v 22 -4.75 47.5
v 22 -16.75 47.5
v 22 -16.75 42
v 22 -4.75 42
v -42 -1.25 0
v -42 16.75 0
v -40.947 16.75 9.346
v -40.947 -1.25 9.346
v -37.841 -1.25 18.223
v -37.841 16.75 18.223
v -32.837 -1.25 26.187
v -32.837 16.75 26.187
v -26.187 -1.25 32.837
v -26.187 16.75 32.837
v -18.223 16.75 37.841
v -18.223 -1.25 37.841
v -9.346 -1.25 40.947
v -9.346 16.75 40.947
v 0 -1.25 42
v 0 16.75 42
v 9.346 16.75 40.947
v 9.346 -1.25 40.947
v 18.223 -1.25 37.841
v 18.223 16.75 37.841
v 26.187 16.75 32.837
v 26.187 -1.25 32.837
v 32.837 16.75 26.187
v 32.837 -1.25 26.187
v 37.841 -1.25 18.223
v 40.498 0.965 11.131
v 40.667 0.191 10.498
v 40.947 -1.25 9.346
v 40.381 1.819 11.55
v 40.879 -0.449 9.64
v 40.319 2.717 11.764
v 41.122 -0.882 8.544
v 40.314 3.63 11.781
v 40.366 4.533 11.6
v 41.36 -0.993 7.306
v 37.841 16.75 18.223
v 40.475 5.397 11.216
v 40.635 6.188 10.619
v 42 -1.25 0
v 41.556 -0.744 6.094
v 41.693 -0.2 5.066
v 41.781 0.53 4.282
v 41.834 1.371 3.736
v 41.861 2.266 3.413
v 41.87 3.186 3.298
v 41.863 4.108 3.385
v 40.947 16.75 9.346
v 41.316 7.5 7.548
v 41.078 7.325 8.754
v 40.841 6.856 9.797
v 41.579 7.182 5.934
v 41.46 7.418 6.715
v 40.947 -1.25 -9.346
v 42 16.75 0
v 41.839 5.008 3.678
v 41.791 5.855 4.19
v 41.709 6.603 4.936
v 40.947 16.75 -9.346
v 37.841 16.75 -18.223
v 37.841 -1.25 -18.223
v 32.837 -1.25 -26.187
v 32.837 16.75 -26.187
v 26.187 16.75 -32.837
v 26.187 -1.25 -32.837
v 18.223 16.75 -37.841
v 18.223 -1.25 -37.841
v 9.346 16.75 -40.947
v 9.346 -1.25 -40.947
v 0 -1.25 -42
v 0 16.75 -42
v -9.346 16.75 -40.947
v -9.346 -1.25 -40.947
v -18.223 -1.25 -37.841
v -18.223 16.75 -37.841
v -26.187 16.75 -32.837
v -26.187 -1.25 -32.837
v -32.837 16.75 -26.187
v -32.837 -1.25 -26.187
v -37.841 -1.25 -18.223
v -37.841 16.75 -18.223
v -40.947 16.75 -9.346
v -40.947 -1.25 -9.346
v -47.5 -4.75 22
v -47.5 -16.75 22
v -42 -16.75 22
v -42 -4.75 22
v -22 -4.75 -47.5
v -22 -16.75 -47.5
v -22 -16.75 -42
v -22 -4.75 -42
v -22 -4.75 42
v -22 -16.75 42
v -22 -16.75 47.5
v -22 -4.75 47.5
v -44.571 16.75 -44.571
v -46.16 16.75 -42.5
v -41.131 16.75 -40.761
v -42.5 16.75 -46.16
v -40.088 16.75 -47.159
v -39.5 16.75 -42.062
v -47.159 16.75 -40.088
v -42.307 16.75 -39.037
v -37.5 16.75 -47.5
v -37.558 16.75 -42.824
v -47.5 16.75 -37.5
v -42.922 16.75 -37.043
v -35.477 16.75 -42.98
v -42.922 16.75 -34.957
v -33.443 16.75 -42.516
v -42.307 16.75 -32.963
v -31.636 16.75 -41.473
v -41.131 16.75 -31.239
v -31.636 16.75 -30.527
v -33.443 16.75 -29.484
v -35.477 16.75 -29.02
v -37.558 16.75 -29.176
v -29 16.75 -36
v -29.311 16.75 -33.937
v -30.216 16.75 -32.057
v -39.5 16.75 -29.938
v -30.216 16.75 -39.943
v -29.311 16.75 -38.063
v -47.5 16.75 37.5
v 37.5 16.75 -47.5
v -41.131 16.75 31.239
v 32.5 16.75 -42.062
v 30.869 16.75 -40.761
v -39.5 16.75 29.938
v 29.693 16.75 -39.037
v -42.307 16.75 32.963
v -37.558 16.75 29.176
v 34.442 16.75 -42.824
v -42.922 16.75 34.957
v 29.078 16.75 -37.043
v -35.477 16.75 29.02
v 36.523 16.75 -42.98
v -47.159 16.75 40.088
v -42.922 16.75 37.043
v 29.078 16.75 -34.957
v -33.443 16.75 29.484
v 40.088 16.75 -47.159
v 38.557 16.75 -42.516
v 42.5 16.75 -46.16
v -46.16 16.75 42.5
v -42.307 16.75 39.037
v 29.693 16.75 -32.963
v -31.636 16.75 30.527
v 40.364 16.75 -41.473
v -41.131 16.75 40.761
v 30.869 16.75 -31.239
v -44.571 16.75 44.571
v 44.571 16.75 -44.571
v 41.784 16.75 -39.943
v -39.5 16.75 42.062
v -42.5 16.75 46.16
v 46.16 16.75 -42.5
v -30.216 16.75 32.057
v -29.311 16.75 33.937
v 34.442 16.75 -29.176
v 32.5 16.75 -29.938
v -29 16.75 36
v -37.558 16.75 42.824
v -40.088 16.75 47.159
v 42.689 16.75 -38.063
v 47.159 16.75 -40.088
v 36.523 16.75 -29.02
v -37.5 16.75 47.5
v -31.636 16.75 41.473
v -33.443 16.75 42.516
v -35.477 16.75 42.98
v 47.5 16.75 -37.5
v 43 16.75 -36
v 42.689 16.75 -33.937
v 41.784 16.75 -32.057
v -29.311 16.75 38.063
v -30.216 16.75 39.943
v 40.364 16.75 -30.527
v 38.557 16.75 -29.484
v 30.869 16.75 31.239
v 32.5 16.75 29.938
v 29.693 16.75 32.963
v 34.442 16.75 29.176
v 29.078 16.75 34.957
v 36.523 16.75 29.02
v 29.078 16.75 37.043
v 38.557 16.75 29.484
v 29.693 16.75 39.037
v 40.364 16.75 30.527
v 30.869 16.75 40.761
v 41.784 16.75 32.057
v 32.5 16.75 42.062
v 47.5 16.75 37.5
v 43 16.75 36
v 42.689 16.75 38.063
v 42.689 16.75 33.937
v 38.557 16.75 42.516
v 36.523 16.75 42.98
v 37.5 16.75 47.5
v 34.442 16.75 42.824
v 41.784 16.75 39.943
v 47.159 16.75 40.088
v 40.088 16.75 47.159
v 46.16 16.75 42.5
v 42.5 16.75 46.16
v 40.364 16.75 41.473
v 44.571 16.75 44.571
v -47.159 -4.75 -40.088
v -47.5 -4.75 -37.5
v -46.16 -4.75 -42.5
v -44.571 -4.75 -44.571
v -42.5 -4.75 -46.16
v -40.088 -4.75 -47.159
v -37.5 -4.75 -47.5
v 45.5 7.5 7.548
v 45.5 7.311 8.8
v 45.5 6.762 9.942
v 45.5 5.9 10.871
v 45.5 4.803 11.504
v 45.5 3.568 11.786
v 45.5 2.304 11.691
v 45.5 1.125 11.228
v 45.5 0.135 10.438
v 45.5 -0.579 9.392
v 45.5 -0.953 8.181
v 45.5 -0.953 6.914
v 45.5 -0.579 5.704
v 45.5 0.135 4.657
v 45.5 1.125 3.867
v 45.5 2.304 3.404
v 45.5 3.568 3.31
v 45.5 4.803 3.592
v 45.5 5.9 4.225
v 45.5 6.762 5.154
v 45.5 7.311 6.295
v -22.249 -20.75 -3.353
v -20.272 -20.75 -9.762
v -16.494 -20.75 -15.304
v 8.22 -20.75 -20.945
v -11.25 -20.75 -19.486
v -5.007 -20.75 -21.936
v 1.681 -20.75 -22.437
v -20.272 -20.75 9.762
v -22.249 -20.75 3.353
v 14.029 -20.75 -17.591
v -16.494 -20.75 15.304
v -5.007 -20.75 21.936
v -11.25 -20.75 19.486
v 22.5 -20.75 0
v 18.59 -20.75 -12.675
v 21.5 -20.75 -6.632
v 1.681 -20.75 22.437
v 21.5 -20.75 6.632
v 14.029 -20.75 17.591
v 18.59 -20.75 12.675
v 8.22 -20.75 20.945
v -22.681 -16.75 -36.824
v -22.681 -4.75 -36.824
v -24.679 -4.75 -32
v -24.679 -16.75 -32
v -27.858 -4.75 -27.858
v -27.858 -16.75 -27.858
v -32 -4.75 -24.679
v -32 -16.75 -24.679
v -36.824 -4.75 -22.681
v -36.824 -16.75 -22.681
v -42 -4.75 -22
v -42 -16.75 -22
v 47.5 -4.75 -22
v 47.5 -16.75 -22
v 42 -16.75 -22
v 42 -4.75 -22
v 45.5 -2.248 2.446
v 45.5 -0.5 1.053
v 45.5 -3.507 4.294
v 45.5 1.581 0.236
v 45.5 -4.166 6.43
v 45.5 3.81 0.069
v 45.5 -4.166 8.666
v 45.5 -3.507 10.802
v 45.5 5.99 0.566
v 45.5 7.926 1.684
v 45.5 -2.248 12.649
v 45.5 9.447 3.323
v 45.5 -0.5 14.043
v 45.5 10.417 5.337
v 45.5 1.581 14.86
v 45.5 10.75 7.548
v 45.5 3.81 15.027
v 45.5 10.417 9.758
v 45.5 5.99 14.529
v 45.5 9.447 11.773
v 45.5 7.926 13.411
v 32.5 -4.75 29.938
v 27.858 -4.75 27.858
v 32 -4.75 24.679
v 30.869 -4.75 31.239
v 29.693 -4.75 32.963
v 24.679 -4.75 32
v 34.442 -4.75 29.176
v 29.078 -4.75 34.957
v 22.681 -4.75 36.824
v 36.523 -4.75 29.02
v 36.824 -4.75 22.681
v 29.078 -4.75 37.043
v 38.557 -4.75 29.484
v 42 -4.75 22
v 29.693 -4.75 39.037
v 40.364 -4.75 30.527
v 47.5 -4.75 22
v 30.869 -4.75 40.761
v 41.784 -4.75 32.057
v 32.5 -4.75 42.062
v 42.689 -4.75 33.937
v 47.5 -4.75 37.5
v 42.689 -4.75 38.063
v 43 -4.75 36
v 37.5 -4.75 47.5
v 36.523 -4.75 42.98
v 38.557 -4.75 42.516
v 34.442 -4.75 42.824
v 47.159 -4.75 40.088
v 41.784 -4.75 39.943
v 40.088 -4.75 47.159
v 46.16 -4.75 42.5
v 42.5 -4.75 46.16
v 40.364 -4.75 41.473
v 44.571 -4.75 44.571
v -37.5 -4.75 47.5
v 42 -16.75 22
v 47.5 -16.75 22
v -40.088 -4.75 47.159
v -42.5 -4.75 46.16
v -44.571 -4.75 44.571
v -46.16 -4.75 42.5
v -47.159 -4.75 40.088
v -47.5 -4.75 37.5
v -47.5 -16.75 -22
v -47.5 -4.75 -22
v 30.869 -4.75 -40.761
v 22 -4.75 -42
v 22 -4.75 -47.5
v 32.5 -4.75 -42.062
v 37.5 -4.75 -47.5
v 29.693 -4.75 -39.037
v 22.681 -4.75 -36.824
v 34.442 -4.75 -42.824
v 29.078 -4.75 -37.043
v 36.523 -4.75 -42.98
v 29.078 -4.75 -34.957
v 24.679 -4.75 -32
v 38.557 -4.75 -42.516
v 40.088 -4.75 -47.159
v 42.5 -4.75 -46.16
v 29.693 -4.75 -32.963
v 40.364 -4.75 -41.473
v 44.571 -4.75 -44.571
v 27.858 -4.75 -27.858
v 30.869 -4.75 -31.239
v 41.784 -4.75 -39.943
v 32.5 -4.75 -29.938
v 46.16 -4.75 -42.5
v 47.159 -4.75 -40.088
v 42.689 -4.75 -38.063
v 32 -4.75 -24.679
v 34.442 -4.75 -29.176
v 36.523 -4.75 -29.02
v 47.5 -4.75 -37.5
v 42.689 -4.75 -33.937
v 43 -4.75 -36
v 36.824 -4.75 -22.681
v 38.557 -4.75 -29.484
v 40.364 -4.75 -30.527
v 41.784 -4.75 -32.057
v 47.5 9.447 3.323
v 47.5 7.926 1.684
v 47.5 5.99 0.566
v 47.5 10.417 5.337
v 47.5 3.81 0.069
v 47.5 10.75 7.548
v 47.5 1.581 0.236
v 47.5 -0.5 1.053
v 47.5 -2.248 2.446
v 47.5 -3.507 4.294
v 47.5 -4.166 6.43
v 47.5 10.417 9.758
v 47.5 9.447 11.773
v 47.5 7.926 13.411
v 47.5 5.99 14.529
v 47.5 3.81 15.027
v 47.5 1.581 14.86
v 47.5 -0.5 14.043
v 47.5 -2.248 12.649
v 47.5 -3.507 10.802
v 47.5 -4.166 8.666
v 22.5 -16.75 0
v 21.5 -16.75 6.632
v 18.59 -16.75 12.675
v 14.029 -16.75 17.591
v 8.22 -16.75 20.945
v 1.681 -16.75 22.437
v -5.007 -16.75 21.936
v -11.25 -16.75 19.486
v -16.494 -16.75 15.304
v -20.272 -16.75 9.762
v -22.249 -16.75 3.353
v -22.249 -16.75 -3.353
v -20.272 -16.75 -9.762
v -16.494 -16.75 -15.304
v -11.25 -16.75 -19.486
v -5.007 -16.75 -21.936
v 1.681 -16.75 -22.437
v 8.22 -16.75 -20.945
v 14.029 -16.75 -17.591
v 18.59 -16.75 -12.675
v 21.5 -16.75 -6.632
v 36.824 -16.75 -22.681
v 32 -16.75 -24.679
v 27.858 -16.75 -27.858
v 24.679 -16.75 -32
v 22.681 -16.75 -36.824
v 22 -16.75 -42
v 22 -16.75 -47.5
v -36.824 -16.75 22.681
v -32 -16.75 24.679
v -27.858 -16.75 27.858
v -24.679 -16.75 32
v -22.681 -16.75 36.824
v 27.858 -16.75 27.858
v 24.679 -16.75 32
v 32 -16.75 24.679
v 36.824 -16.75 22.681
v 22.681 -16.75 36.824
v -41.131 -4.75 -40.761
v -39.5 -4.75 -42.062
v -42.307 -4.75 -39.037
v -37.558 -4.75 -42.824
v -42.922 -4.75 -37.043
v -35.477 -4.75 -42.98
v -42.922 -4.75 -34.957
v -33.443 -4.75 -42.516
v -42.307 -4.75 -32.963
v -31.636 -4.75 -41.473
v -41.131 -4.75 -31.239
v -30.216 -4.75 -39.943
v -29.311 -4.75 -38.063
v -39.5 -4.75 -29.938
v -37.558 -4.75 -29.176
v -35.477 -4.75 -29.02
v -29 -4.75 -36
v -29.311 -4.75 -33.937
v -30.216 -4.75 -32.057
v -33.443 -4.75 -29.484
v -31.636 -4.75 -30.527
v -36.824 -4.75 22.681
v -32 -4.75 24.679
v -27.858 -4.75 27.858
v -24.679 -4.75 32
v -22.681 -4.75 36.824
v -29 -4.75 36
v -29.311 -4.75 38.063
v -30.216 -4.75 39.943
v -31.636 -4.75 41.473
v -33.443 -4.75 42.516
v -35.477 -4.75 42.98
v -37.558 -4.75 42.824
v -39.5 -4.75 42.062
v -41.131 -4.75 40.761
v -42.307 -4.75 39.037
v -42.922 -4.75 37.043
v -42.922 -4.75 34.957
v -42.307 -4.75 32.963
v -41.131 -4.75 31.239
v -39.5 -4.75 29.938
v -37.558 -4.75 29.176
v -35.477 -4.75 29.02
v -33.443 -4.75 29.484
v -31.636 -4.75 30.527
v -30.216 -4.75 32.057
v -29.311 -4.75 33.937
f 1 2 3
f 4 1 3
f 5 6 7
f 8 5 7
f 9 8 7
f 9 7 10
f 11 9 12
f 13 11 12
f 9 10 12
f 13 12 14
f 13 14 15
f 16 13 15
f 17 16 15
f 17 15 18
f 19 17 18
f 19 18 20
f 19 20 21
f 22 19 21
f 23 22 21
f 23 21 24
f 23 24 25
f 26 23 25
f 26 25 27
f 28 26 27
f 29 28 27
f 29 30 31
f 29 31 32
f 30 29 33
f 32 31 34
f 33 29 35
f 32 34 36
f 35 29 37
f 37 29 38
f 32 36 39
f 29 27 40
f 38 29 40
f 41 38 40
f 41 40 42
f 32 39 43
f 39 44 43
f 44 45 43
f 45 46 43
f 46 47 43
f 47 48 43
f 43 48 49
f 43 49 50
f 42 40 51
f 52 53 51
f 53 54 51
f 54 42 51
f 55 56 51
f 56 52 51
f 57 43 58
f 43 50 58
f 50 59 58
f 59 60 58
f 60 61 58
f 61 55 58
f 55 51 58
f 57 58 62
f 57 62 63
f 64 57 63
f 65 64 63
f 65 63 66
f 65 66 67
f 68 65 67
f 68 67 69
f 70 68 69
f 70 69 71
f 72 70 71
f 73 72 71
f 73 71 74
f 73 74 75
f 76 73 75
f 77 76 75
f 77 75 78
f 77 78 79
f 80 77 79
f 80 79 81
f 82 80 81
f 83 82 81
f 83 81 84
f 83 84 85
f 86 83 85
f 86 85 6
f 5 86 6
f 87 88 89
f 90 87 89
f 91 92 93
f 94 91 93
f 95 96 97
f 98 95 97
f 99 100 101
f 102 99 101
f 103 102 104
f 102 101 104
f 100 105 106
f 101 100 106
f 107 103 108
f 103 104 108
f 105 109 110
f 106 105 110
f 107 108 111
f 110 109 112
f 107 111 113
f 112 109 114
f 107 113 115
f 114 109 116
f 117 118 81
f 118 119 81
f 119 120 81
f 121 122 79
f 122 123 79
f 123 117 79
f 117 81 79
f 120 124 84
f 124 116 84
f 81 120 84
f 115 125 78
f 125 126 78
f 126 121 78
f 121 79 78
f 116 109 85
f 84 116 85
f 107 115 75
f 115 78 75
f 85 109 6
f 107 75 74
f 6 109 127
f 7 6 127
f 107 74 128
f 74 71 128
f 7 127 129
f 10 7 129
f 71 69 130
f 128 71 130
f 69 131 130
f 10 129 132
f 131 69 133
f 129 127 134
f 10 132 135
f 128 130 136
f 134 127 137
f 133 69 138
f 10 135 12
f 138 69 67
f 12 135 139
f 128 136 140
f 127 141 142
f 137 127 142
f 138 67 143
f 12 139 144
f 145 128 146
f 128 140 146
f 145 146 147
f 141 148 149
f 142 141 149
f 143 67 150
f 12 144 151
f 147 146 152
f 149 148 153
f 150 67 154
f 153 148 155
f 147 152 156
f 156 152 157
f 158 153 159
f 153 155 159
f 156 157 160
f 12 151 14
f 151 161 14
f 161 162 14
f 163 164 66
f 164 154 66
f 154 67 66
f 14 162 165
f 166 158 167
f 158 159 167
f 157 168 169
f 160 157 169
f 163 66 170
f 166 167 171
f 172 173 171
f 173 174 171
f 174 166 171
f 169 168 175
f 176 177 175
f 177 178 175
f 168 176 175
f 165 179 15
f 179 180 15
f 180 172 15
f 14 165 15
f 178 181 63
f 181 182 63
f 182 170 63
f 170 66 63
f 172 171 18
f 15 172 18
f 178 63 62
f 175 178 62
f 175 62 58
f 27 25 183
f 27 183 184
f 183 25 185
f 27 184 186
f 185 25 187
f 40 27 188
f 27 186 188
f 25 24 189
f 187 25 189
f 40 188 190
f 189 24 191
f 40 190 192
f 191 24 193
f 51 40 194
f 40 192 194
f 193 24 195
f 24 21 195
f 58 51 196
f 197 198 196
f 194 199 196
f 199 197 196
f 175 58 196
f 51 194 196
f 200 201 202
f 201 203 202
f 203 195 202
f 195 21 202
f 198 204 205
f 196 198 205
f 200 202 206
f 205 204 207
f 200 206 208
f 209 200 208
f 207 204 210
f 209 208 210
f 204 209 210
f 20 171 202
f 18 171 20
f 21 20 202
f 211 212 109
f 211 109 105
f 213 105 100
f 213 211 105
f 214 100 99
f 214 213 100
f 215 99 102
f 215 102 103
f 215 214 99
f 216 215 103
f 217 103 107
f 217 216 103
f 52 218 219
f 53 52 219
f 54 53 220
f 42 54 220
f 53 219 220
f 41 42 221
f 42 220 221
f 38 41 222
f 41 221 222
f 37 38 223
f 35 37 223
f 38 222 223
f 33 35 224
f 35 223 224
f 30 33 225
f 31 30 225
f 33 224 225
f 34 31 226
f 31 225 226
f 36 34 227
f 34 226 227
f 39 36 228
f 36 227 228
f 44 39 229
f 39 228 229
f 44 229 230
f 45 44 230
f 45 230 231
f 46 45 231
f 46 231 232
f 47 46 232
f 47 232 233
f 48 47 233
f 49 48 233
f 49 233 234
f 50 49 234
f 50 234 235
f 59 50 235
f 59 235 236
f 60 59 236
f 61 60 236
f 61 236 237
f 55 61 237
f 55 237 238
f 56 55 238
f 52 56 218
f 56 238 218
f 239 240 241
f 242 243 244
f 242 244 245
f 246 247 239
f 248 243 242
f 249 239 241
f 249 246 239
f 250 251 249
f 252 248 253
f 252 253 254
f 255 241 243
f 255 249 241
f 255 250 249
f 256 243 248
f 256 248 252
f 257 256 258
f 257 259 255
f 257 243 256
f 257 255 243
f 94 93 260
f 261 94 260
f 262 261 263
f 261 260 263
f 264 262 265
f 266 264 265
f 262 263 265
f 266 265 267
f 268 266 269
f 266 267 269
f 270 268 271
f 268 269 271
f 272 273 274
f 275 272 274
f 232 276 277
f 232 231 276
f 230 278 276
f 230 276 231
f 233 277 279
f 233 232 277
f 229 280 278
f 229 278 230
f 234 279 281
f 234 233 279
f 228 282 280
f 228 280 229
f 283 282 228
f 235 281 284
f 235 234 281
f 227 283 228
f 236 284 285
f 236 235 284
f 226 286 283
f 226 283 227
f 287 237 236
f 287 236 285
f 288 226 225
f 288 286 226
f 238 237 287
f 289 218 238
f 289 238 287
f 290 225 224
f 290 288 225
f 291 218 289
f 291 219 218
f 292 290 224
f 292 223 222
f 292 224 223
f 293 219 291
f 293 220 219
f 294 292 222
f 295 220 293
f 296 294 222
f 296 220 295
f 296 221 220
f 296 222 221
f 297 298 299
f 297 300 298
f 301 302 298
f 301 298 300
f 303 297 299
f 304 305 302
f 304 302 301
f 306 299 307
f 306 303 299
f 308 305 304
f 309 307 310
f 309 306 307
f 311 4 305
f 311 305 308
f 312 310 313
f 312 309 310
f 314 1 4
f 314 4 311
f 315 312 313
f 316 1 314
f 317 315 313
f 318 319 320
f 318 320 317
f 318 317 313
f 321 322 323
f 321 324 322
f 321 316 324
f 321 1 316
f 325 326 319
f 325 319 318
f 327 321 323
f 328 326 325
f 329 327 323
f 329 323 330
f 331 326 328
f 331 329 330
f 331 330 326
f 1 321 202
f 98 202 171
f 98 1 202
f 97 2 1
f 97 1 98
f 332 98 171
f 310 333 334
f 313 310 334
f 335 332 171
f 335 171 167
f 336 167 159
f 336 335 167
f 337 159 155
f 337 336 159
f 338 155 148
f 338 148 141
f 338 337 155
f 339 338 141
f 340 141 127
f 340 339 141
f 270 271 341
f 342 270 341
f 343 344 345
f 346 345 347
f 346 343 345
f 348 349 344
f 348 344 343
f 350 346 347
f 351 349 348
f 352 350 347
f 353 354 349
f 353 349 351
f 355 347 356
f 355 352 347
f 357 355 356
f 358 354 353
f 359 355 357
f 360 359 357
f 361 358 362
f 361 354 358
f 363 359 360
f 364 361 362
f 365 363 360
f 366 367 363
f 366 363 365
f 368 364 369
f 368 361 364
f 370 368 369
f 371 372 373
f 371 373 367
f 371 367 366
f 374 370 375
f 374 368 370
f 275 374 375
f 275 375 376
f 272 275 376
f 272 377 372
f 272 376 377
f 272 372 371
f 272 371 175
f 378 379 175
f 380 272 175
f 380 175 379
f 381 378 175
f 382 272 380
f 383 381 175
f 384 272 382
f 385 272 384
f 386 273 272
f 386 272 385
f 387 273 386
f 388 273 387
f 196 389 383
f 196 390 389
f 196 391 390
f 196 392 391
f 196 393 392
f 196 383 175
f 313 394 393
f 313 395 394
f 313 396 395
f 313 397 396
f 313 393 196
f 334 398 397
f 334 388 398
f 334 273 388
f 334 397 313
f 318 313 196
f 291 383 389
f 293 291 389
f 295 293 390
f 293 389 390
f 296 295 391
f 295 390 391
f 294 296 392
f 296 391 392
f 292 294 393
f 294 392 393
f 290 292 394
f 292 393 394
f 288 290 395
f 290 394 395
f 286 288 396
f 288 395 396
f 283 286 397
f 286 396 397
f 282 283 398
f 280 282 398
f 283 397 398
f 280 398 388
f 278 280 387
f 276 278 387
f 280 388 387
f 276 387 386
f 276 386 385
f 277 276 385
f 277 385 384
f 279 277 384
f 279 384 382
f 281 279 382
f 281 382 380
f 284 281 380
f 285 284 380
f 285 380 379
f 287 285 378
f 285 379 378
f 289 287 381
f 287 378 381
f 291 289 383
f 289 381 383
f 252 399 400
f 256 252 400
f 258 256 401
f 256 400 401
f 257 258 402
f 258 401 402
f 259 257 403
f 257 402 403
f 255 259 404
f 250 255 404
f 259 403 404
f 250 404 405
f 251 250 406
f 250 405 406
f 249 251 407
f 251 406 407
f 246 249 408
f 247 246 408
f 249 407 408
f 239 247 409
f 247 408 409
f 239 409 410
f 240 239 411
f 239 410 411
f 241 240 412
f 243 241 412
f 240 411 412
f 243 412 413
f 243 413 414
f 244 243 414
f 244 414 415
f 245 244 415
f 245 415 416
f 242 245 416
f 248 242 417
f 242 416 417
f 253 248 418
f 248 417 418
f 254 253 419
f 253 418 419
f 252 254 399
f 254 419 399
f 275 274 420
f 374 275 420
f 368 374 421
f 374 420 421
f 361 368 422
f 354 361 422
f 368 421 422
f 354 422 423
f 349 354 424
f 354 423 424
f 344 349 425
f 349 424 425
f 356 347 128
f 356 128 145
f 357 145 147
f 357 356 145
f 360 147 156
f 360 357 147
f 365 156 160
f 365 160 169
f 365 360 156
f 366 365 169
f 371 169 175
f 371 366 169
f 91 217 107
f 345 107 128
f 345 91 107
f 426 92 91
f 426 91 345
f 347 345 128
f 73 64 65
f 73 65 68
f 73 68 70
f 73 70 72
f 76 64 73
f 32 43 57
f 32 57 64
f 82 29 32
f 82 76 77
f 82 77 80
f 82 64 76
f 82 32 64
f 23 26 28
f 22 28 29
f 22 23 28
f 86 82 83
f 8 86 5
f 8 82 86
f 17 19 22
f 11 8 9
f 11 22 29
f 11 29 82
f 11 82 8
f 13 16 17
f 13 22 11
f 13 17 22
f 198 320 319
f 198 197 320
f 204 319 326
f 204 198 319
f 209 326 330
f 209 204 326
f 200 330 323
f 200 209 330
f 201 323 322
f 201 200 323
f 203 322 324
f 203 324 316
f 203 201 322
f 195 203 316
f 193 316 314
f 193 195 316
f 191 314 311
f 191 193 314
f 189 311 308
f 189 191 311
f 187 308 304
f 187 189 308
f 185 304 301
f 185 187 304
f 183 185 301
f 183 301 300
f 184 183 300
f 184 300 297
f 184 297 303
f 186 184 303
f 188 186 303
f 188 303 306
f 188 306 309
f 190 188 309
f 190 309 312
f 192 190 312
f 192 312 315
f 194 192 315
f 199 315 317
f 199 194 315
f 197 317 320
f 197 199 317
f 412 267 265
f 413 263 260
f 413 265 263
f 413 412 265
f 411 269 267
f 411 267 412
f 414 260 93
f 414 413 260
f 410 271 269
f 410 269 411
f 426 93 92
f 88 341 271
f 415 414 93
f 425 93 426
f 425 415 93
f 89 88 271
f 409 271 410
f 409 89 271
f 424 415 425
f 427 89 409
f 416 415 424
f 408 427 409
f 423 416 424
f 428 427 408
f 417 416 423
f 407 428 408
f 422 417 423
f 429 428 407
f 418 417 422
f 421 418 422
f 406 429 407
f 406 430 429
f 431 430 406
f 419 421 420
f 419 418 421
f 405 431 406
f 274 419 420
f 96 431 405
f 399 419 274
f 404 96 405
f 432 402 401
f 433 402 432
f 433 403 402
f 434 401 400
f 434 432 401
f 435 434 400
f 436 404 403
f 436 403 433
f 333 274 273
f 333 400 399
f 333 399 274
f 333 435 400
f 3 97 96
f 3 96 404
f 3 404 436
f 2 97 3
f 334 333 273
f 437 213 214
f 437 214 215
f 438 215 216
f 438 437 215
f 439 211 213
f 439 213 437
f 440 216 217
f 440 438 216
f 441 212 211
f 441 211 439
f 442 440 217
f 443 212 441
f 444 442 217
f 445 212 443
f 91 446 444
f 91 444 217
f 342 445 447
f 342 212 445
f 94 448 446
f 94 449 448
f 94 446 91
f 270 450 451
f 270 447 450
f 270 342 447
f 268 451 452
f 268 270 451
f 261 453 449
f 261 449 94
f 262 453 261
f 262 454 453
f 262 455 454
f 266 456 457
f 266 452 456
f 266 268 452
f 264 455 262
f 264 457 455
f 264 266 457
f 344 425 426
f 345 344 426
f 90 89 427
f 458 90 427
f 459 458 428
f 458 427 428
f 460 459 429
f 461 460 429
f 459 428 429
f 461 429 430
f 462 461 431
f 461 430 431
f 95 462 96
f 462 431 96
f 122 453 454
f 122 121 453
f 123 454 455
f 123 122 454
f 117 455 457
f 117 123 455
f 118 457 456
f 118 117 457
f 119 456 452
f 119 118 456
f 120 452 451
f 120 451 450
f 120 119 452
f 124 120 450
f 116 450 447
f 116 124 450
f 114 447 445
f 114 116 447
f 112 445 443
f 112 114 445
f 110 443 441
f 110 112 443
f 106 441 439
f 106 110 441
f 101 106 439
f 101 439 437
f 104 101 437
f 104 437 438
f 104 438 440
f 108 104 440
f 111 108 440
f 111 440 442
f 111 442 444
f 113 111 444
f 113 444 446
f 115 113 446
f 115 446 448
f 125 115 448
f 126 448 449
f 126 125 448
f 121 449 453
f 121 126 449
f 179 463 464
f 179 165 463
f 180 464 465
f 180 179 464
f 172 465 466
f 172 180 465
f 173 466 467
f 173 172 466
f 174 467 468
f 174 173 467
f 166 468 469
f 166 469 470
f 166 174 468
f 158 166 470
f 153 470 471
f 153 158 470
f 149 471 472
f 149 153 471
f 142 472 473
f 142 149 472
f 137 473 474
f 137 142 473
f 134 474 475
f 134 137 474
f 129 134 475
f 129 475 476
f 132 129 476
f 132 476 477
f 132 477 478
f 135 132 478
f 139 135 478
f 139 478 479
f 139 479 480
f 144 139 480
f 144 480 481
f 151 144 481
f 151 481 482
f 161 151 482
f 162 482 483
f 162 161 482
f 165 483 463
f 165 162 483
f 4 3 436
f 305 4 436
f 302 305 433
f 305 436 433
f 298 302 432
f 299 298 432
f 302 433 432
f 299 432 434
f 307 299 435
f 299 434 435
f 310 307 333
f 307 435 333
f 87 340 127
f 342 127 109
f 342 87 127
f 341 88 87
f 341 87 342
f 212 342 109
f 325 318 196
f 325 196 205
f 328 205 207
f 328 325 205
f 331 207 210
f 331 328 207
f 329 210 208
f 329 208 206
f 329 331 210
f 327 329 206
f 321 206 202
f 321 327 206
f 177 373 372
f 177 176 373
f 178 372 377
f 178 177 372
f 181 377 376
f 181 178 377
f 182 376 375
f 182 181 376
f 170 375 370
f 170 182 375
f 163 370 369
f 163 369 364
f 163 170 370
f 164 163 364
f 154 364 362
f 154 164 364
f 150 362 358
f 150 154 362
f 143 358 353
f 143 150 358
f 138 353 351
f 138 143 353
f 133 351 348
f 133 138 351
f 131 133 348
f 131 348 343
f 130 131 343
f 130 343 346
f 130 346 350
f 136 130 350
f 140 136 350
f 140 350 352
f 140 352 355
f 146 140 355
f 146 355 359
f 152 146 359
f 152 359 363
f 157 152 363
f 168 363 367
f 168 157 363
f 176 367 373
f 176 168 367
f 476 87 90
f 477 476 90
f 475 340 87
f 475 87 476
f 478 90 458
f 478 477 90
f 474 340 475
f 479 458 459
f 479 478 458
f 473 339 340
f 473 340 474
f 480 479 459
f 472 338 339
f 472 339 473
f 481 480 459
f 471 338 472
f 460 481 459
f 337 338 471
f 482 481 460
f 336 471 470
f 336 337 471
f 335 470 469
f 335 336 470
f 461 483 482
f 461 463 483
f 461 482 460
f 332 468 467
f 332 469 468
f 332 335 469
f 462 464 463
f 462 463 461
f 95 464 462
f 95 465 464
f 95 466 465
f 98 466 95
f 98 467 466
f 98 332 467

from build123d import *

# Parameters (mm, degrees)
F0_R      = 7
F1_DEPTH  = 16.75
F2_R      = 7
F3_DEPTH  = 12
F4_R      = 22.5
F5_DEPTH  = 4
F6_R      = 42
F8_DEPTH  = 18
F7_R      = 7.5
F7_R_2    = 4.25
F9_DEPTH  = 2
F10_DEPTH = 8


with BuildPart() as f1:
    # F0 (on Front) → F1 (new body, symmetric)
    with BuildSketch(Plane.XZ):
        with BuildLine():
            Line((-37.5, -47.5), (37.5, -47.5))
            ThreePointArc((37.5, -47.5), (44.5710678119, -44.5710678119), (47.5, -37.5))
            Line((47.5, -37.5), (47.5, 37.5))
            ThreePointArc((47.5, 37.5), (44.5710678119, 44.5710678119), (37.5, 47.5))
            Line((37.5, 47.5), (-37.5, 47.5))
            ThreePointArc((-37.5, 47.5), (-44.5710678119, 44.5710678119), (-47.5, 37.5))
            Line((-47.5, 37.5), (-47.5, -37.5))
            ThreePointArc((-47.5, -37.5), (-44.5710678119, -44.5710678119), (-37.5, -47.5))
        make_face()
        with Locations((-36, -36)):
            Circle(F0_R, mode=Mode.SUBTRACT)
        with Locations((36, -36)):
            Circle(F0_R, mode=Mode.SUBTRACT)
        with Locations((-36, 36)):
            Circle(F0_R, mode=Mode.SUBTRACT)
        with Locations((36, 36)):
            Circle(F0_R, mode=Mode.SUBTRACT)
    extrude(amount=F1_DEPTH, both=True)

    # F2 (on face) → F3 (cut)
    with BuildSketch(Plane.XZ.offset(16.75)):
        with BuildLine():
            Line((22, -42), (22, -47.5))
            Line((22, -47.5), (37.5, -47.5))
            ThreePointArc((37.5, -47.5), (44.5710678119, -44.5710678119), (47.5, -37.5))
            Line((47.5, -37.5), (47.5, -22))
            Line((47.5, -22), (42, -22))
            ThreePointArc((42, -22), (27.8578643763, -27.8578643763), (22, -42))
        make_face()
        with Locations((36, -36)):
            Circle(F2_R, mode=Mode.SUBTRACT)
        with BuildLine():
            Line((37.5, 47.5), (22, 47.5))
            Line((22, 47.5), (22, 42))
            ThreePointArc((22, 42), (27.8578643763, 27.8578643763), (42, 22))
            Line((42, 22), (47.5, 22))
            Line((47.5, 22), (47.5, 37.5))
            ThreePointArc((47.5, 37.5), (44.5710678119, 44.5710678119), (37.5, 47.5))
        make_face()
        with Locations((36, 36)):
            Circle(F2_R, mode=Mode.SUBTRACT)
        with BuildLine():
            Line((-47.5, 37.5), (-47.5, 22))
            Line((-47.5, 22), (-42, 22))
            ThreePointArc((-42, 22), (-27.8578643763, 27.8578643763), (-22, 42))
            Line((-22, 42), (-22, 47.5))
            Line((-22, 47.5), (-37.5, 47.5))
            ThreePointArc((-37.5, 47.5), (-44.5710678119, 44.5710678119), (-47.5, 37.5))
        make_face()
        with Locations((-36, 36)):
            Circle(F2_R, mode=Mode.SUBTRACT)
        with BuildLine():
            Line((-42, -22), (-47.5, -22))
            Line((-47.5, -22), (-47.5, -37.5))
            ThreePointArc((-47.5, -37.5), (-44.5710678119, -44.5710678119), (-37.5, -47.5))
            Line((-37.5, -47.5), (-22, -47.5))
            Line((-22, -47.5), (-22, -42))
            ThreePointArc((-22, -42), (-27.8578643763, -27.8578643763), (-42, -22))
        make_face()
        with Locations((-36, -36)):
            Circle(F2_R, mode=Mode.SUBTRACT)
    extrude(amount=-F3_DEPTH, mode=Mode.SUBTRACT)

    # F4 (on face) → F5 (join)
    with BuildSketch(Plane.XZ.offset(16.75)):
        Circle(F4_R)
    extrude(amount=F5_DEPTH)

    # F6 (on face) → F8 (cut)
    with BuildSketch(Plane(origin=(0, 16.75, 0), x_dir=(-1, 0, 0), z_dir=(0, 1, 0))):
        Circle(F6_R)
    extrude(amount=-F8_DEPTH, mode=Mode.SUBTRACT)

    # F7 (on face) → F9 (cut)
    with BuildSketch(Plane.YZ.offset(47.5)):
        with Locations((3.25, 7.547759451)):
            Circle(F7_R)
        with Locations((3.25, 7.547759451)):
            Circle(F7_R_2, mode=Mode.SUBTRACT)
    extrude(amount=-F9_DEPTH, mode=Mode.SUBTRACT)

    # F10 (cut): a face of the model
    f10_faces = [f1.faces().sort_by_distance(p)[0] for p in [
        (47.5, 3.25, 7.547759451),
    ]]
    extrude(f10_faces, amount=-F10_DEPTH, mode=Mode.SUBTRACT)


solid = f1.part
